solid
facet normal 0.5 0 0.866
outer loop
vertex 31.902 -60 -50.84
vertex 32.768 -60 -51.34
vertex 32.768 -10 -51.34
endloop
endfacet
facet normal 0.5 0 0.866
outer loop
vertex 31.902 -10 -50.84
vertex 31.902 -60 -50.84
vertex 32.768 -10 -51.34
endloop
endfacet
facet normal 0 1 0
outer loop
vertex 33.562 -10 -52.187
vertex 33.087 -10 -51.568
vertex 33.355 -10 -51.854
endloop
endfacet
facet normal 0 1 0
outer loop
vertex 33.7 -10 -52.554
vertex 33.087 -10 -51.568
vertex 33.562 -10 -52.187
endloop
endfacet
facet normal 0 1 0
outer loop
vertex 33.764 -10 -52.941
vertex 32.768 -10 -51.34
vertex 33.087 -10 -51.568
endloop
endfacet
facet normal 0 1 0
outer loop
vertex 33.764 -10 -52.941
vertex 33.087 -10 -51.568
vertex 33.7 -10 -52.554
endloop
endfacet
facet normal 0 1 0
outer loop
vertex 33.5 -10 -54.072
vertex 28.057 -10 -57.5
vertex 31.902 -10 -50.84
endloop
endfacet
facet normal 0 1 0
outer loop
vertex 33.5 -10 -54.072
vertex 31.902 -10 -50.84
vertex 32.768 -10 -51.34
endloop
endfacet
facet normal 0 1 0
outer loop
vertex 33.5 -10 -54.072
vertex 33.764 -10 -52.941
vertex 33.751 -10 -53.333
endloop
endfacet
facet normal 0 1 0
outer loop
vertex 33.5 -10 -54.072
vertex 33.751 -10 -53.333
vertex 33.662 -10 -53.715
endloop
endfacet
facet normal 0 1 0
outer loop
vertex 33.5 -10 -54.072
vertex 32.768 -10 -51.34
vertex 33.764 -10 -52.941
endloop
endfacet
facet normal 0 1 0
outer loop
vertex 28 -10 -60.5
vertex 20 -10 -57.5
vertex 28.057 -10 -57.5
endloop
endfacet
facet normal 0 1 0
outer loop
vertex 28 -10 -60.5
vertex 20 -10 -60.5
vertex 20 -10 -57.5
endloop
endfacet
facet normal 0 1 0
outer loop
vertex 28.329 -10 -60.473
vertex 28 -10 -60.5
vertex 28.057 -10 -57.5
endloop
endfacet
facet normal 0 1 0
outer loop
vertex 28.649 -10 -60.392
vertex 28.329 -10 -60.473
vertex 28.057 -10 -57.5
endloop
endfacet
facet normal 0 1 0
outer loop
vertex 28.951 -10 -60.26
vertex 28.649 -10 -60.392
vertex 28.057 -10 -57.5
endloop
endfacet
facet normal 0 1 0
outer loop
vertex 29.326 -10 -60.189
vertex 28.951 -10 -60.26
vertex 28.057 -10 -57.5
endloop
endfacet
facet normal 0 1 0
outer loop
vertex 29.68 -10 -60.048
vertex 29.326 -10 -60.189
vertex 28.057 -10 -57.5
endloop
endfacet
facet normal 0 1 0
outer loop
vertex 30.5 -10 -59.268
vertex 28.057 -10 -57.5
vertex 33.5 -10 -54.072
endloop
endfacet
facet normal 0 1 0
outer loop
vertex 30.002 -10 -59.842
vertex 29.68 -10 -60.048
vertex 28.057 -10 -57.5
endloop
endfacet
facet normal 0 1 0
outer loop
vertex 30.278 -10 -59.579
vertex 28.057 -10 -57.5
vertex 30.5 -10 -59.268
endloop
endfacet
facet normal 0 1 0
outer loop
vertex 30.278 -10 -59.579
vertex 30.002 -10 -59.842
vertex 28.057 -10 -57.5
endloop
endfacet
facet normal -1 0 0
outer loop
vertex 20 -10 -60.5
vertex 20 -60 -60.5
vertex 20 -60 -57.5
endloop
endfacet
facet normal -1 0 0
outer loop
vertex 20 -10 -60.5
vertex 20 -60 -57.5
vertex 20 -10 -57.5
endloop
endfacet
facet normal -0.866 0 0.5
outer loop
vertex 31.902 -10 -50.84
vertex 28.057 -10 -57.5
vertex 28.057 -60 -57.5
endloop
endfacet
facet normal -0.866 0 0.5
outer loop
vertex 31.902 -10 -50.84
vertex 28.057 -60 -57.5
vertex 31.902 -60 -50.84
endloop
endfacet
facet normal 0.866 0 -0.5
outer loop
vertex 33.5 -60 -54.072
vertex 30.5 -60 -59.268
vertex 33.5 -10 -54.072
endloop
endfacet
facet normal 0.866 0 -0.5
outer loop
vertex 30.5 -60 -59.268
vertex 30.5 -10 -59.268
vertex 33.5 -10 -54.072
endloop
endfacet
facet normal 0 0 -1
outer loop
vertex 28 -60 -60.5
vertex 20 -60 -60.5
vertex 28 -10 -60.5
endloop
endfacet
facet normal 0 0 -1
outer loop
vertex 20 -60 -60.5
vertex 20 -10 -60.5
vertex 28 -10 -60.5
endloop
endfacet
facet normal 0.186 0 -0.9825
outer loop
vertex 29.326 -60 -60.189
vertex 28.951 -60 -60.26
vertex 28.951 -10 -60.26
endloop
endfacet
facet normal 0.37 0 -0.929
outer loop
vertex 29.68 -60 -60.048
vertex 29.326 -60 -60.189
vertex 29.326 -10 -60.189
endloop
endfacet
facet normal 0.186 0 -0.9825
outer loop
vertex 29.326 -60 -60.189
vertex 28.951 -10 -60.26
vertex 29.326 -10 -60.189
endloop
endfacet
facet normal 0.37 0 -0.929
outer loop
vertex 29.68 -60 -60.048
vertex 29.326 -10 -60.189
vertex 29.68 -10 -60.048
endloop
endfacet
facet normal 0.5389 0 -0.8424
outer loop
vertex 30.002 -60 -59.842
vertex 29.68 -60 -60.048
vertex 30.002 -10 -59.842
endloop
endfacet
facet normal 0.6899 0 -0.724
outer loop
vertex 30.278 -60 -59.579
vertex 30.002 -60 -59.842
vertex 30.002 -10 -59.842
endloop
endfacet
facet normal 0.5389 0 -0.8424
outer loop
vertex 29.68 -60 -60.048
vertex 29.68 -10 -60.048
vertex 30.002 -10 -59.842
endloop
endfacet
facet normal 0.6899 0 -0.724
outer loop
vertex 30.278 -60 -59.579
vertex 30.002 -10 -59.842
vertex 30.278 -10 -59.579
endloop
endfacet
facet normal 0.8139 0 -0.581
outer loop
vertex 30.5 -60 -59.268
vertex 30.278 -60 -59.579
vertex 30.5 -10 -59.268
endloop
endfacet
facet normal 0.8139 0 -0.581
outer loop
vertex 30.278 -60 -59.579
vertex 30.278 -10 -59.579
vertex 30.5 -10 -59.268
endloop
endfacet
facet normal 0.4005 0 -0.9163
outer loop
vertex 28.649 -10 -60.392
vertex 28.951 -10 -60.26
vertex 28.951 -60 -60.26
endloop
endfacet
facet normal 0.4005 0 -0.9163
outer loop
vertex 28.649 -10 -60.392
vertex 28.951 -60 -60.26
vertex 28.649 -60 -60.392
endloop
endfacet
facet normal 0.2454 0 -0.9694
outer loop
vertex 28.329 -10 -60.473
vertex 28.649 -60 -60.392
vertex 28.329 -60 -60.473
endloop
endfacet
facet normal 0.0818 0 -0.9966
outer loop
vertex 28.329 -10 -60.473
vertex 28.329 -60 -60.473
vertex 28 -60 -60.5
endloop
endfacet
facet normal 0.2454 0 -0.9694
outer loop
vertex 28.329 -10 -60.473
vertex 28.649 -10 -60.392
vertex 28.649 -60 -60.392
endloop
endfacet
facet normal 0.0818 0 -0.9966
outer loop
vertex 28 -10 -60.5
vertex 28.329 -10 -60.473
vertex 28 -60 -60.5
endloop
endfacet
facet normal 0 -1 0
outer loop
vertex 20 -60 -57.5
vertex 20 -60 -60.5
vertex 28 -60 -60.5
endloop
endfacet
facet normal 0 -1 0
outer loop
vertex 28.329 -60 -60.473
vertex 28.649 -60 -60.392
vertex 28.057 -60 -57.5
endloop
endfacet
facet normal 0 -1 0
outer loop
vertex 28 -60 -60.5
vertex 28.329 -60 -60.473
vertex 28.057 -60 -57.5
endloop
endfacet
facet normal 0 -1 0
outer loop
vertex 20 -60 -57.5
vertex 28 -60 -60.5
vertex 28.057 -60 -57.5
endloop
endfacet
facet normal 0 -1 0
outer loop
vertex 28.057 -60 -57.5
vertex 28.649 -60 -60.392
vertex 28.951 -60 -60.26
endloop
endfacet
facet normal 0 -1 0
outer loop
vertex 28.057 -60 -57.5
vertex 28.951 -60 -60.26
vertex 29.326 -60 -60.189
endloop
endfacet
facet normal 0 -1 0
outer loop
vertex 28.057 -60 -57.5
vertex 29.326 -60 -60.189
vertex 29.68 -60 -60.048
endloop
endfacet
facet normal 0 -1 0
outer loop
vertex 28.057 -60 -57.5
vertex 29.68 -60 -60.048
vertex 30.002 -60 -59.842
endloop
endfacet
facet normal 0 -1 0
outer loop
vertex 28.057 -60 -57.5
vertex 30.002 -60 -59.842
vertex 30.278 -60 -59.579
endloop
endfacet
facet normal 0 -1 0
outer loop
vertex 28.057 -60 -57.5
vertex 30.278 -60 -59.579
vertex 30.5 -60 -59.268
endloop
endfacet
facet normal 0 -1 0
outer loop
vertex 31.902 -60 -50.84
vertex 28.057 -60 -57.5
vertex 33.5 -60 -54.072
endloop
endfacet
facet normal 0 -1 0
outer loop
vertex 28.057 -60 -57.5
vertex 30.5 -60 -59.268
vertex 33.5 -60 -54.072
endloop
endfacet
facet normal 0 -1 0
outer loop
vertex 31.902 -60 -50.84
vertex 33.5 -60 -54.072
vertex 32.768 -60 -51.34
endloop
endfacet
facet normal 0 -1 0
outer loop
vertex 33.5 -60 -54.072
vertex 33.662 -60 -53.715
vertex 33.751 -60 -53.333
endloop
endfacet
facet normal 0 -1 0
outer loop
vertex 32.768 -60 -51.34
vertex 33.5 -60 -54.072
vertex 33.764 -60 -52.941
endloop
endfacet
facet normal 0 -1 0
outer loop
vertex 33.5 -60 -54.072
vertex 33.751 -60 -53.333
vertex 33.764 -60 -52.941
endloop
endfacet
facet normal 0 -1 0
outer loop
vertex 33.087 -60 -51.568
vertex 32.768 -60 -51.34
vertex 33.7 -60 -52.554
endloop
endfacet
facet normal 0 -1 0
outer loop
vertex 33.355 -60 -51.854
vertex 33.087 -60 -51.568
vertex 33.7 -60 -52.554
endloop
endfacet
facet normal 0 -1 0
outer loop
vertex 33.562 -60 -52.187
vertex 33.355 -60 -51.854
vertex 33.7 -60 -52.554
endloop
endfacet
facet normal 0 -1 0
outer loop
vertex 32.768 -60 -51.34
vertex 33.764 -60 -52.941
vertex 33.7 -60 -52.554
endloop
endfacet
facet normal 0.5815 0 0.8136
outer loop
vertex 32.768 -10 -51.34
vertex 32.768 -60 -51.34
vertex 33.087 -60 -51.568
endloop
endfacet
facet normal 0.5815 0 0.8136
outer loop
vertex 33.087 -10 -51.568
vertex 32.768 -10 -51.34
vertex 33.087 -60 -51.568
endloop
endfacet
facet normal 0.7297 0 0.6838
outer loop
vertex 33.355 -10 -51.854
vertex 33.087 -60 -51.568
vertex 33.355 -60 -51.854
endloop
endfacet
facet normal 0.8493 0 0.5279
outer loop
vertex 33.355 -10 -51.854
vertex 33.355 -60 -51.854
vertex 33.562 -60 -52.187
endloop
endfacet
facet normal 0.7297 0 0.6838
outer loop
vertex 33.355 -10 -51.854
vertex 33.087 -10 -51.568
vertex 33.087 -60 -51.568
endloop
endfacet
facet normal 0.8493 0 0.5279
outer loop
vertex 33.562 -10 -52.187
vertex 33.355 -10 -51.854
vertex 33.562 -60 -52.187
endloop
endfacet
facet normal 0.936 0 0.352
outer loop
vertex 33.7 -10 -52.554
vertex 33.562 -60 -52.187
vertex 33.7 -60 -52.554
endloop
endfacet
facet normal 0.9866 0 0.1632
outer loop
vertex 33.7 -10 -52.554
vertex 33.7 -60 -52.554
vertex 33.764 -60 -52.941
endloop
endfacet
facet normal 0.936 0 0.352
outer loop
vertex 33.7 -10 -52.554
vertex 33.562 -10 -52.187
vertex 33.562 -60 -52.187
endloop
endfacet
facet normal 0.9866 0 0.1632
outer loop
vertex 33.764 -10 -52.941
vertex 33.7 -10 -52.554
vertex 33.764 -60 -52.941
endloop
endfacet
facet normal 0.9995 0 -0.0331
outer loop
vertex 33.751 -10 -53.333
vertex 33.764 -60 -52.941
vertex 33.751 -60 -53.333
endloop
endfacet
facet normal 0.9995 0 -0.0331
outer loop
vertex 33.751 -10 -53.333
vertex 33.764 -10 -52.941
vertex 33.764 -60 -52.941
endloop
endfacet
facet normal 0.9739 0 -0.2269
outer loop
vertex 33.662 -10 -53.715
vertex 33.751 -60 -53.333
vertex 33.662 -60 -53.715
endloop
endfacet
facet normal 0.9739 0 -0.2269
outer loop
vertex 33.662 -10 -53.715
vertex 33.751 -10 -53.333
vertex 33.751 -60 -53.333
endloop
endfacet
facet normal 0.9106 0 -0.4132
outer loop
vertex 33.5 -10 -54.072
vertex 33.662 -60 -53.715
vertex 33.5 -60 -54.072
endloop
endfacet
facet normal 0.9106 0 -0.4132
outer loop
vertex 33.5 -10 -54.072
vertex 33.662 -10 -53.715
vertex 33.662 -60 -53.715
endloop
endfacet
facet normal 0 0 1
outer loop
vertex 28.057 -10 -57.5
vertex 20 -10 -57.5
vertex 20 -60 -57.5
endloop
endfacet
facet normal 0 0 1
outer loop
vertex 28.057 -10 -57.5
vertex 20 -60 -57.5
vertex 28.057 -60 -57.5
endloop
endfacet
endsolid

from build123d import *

# Parameters (mm, degrees)
BOX001_W        = 10
BOX001_H        = 50
BOX001_DEPTH    = 3
FILLET001_R     = 2
BOX_W           = 10
BOX_H           = 50
BOX_DEPTH       = 3
BOX_PITCH_ANGLE = -60
FILLET_R        = 2


with BuildPart() as fillet001:
    # Box001 → Box001 (new body)
    with BuildSketch(Plane(origin=(20, -60, -60.5), x_dir=(1, 0, 0), z_dir=(0, 0, 1))):
        with Locations((5, 25)):
            Rectangle(BOX001_W, BOX001_H)
    extrude(amount=BOX001_DEPTH)

    # Fillet001
    fillet001_edges = [fillet001.edges().sort_by_distance(p)[0] for p in [
        (30, -35, -60.5),
    ]]
    fillet(fillet001_edges, radius=FILLET001_R)


with BuildPart() as soportepila:
    # Box → Box (new body)
    with BuildSketch(Plane.XY):
        with Locations((5, 25)):
            Rectangle(BOX_W, BOX_H)
    extrude(amount=BOX_DEPTH)


with BuildPart() as soportepila_1:
    # Box pitch: moved
    add(soportepila.part.rotate(Axis((0, 0, 0), (0, 1, 0)), BOX_PITCH_ANGLE))


with BuildPart() as soportepila_2:
    # Box placement: moved
    add(soportepila_1.part.moved(Location((30, -60, -60.5))))

    # Fillet
    fillet_edges = [soportepila_2.edges().sort_by_distance(p)[0] for p in [
        (30, -35, -60.5),
        (35, -35, -51.839746),
    ]]
    fillet(fillet_edges, radius=FILLET_R)


with BuildPart() as soportepila_3:
    # Fillet placement: moved
    add(soportepila_2.part.moved(Location((-0.5, 0, -0.5))))

    # Fusion: union Fillet001
    add(fillet001.part)


solid = soportepila_3.part
